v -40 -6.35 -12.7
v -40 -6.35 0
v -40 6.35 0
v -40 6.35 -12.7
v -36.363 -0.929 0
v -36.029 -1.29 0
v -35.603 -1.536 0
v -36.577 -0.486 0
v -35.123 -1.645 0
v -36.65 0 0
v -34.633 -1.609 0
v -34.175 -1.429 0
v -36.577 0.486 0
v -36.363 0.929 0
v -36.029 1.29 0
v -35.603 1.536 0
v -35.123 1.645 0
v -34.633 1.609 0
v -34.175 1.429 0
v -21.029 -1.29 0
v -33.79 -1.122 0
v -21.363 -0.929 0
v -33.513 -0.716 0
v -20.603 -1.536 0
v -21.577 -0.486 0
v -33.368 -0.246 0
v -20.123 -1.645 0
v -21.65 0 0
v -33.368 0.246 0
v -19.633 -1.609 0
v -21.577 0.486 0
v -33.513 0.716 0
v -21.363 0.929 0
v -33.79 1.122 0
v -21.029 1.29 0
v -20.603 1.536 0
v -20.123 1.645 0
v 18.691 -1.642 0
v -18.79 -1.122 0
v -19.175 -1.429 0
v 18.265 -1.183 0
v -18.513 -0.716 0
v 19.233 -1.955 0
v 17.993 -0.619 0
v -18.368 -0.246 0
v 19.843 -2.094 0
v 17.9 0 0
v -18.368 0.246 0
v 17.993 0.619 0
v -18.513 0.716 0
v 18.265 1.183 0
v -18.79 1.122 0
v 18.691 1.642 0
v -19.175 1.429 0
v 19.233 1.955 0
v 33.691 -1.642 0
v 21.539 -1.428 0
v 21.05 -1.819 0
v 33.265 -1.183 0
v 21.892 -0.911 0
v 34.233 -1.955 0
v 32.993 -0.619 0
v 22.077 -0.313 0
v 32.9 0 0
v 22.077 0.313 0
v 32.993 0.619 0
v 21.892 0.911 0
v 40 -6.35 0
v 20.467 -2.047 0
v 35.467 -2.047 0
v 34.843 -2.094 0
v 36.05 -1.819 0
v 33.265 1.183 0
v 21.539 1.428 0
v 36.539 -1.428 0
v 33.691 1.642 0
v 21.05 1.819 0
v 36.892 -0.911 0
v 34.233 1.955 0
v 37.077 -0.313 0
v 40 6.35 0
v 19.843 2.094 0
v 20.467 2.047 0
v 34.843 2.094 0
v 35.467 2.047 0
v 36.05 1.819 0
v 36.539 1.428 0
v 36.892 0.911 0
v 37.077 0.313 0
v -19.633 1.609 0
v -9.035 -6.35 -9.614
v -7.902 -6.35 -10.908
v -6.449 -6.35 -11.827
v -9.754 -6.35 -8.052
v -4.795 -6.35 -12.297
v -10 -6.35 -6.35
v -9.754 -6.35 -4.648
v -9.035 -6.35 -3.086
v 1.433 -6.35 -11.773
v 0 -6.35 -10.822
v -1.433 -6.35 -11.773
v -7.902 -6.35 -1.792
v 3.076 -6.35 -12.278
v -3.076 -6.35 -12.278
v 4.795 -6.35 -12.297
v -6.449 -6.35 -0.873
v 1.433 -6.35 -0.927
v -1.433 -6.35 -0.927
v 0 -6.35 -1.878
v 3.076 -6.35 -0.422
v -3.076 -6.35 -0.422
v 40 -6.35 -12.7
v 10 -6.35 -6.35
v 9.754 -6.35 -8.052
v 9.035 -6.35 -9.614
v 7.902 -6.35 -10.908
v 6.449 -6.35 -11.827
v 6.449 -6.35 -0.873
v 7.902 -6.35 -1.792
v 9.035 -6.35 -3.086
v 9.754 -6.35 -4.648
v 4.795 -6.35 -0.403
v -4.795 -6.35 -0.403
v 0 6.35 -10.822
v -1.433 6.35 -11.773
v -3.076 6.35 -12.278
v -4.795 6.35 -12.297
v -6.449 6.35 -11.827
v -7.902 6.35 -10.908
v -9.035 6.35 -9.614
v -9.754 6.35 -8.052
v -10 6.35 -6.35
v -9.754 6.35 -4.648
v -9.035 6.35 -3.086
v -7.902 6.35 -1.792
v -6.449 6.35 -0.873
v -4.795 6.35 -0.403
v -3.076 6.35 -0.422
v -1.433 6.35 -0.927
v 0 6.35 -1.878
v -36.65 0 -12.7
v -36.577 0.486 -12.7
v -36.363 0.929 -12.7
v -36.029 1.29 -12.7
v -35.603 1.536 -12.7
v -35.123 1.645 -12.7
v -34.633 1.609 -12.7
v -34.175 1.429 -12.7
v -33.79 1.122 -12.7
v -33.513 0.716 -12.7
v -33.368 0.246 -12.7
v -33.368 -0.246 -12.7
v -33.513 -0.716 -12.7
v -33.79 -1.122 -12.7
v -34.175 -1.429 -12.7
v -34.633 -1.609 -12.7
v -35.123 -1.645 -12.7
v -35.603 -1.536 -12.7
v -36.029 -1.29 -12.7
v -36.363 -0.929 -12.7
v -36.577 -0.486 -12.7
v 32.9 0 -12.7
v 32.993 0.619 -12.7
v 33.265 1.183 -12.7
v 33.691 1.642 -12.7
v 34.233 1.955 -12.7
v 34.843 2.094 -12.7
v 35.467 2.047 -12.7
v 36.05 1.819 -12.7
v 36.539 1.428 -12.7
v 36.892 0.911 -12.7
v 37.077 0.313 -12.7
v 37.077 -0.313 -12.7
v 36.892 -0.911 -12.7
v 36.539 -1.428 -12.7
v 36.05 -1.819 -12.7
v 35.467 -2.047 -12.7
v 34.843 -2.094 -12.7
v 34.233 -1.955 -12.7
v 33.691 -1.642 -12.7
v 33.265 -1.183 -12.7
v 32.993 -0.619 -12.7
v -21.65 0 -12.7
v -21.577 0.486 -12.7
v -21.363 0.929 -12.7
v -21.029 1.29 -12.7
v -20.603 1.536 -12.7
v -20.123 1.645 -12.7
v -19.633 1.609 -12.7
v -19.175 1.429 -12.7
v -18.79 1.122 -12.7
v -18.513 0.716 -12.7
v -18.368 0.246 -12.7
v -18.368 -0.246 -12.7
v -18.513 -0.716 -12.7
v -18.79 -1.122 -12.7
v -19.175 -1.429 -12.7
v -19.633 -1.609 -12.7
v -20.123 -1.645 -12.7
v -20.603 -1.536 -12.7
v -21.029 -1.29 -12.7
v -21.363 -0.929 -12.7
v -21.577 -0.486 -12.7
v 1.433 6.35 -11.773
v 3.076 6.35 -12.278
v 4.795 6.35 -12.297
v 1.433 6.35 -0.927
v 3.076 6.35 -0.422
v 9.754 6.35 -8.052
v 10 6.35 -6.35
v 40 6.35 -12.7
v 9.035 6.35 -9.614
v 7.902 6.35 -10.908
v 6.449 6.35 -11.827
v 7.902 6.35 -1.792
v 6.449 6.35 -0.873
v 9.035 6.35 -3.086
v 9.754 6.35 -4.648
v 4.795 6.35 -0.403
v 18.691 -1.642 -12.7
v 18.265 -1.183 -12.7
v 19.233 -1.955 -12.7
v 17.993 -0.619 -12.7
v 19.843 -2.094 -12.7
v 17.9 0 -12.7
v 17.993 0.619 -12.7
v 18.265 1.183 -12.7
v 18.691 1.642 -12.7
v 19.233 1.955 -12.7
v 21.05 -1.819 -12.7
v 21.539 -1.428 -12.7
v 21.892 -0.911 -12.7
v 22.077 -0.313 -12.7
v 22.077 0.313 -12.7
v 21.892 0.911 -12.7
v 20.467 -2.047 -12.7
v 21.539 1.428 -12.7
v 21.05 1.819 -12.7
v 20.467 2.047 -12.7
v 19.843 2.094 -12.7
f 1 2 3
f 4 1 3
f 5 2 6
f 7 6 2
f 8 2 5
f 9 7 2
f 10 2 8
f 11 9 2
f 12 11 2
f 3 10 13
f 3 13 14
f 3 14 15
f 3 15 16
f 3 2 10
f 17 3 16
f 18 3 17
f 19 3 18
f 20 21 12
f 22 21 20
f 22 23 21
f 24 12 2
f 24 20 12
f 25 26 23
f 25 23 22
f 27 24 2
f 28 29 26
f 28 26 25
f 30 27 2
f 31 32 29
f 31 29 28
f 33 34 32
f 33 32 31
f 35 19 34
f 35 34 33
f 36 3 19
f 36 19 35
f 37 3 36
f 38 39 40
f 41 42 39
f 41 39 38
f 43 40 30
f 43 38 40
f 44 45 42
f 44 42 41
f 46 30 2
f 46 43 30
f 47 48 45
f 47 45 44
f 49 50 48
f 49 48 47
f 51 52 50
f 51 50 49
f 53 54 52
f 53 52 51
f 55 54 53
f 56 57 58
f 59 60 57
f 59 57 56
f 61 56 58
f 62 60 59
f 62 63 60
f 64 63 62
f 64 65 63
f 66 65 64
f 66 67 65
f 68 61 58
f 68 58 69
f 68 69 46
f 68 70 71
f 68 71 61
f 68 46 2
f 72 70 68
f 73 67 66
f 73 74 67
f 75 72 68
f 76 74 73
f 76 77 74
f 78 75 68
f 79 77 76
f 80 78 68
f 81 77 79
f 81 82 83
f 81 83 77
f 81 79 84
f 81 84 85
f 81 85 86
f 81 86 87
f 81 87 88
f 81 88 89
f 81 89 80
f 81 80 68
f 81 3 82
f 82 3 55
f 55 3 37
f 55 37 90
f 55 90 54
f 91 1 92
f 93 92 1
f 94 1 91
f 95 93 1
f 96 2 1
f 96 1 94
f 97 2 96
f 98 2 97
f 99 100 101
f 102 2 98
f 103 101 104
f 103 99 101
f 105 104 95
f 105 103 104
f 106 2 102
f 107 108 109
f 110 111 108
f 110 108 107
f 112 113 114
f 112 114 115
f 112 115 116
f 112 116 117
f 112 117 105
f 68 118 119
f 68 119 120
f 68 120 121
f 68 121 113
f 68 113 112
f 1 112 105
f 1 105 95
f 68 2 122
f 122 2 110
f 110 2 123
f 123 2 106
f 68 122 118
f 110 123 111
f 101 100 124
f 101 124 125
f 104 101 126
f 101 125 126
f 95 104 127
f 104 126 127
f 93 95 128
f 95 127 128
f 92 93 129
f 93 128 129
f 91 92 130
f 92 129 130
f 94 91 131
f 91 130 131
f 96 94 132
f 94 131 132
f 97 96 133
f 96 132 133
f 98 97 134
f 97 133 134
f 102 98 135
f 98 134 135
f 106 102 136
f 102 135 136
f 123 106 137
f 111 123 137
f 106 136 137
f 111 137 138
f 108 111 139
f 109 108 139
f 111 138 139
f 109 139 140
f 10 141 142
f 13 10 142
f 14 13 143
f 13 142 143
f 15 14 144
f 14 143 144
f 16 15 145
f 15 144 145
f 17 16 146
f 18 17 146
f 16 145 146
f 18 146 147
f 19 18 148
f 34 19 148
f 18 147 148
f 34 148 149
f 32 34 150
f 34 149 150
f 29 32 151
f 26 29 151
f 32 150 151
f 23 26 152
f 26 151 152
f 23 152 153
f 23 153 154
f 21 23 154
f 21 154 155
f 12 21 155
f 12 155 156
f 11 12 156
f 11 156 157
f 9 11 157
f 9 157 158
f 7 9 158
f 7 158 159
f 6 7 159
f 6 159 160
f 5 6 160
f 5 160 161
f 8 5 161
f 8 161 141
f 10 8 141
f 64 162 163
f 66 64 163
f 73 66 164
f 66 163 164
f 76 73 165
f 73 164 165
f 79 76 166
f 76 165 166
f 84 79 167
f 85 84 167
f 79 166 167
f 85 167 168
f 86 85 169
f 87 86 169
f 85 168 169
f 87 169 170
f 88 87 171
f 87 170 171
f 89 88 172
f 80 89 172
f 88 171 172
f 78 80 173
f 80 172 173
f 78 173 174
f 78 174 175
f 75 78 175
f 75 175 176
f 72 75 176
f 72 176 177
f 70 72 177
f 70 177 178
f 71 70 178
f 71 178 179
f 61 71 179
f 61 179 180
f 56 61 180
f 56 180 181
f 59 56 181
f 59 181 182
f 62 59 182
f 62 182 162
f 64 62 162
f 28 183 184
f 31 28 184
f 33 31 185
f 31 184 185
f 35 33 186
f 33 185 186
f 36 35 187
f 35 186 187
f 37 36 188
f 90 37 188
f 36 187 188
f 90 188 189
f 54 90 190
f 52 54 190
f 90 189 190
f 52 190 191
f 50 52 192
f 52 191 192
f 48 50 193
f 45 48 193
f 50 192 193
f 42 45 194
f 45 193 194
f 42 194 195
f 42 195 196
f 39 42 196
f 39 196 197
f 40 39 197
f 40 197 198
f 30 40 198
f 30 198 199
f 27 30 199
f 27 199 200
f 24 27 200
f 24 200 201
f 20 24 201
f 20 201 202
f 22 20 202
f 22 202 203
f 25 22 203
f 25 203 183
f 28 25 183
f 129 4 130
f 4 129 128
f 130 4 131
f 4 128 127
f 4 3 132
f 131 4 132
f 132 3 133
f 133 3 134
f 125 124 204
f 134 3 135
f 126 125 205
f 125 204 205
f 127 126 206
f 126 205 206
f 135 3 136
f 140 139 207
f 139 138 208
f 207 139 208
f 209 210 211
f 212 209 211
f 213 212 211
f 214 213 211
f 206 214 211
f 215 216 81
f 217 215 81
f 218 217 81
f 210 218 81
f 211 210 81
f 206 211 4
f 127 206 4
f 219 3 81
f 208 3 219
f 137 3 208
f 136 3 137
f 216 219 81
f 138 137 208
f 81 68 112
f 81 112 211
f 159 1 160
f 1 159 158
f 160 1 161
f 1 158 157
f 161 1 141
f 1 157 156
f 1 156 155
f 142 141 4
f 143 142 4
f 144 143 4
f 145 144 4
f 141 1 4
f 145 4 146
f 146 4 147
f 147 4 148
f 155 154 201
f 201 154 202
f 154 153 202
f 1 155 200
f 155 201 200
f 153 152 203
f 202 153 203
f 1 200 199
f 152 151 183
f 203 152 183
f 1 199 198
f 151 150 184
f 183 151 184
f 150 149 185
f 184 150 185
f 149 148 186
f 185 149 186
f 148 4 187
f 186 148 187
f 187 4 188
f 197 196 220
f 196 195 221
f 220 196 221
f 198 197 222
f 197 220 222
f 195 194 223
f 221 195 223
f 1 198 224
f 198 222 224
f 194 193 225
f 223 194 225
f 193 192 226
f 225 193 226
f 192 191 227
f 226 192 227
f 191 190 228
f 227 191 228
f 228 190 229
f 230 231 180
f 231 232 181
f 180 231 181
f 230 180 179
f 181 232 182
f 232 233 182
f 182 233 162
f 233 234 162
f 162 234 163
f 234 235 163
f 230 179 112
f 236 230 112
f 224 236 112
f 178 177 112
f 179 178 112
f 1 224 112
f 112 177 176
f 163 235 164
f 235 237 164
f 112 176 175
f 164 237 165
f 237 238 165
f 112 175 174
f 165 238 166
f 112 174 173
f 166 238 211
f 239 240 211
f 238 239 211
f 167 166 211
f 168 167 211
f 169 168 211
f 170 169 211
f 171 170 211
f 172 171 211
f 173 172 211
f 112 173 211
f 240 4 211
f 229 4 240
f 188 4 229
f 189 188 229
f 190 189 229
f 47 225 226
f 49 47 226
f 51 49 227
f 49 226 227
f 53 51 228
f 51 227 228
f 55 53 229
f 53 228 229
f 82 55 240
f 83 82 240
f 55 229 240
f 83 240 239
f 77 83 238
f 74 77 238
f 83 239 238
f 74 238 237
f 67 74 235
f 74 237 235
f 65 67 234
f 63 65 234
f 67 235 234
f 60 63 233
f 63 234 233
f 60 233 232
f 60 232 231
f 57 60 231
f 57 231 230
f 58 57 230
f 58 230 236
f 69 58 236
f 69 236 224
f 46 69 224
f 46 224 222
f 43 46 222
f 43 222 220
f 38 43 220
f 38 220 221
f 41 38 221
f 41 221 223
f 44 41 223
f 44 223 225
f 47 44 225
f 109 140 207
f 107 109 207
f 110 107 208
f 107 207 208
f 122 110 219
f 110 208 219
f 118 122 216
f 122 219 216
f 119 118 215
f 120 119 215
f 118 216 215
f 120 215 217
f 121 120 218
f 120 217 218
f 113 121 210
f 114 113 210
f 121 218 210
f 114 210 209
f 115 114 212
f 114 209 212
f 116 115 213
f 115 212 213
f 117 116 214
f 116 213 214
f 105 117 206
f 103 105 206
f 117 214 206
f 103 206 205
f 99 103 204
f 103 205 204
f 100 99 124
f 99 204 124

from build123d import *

# Parameters (mm, degrees)
SKETCH1_W               = 80
SKETCH1_H               = 12.7
BOSS_EXTRUDE1_DEPTH     = 12.7
TAP_DRILL_FOR_M5_TAP1_D = 4.2
TAP_DRILL_FOR_M4_TAP1_D = 3.3
SKETCH6_R               = 6
CUT_EXTRUDE1_DEPTH      = 44.847234804


with BuildPart() as part:
    # Sketch1 → Boss-Extrude1 (new body)
    with BuildSketch(Plane.XY):
        Rectangle(SKETCH1_W, SKETCH1_H)
    extrude(amount=-BOSS_EXTRUDE1_DEPTH)

    # Tap Drill for M5 Tap1 (through all)
    with Locations(Plane.XY):
        with Locations((20, 0), (35, 0)):
            Hole(TAP_DRILL_FOR_M5_TAP1_D / 2)

    # Tap Drill for M4 Tap1 (through all)
    with Locations(Plane.XY):
        with Locations((-35, 0), (-20, 0)):
            Hole(TAP_DRILL_FOR_M4_TAP1_D / 2)

    # Sketch6 → Cut-Extrude1 (cut, through all)
    with BuildSketch(Plane(origin=(0, 6.35, 0), x_dir=(1, 0, 0), z_dir=(0, 1, 0))):
        with Locations((-4, 6.35)):
            Circle(SKETCH6_R)
        with Locations((4, 6.35)):
            Circle(SKETCH6_R)
    extrude(amount=-CUT_EXTRUDE1_DEPTH, mode=Mode.SUBTRACT)


solid = part.part
